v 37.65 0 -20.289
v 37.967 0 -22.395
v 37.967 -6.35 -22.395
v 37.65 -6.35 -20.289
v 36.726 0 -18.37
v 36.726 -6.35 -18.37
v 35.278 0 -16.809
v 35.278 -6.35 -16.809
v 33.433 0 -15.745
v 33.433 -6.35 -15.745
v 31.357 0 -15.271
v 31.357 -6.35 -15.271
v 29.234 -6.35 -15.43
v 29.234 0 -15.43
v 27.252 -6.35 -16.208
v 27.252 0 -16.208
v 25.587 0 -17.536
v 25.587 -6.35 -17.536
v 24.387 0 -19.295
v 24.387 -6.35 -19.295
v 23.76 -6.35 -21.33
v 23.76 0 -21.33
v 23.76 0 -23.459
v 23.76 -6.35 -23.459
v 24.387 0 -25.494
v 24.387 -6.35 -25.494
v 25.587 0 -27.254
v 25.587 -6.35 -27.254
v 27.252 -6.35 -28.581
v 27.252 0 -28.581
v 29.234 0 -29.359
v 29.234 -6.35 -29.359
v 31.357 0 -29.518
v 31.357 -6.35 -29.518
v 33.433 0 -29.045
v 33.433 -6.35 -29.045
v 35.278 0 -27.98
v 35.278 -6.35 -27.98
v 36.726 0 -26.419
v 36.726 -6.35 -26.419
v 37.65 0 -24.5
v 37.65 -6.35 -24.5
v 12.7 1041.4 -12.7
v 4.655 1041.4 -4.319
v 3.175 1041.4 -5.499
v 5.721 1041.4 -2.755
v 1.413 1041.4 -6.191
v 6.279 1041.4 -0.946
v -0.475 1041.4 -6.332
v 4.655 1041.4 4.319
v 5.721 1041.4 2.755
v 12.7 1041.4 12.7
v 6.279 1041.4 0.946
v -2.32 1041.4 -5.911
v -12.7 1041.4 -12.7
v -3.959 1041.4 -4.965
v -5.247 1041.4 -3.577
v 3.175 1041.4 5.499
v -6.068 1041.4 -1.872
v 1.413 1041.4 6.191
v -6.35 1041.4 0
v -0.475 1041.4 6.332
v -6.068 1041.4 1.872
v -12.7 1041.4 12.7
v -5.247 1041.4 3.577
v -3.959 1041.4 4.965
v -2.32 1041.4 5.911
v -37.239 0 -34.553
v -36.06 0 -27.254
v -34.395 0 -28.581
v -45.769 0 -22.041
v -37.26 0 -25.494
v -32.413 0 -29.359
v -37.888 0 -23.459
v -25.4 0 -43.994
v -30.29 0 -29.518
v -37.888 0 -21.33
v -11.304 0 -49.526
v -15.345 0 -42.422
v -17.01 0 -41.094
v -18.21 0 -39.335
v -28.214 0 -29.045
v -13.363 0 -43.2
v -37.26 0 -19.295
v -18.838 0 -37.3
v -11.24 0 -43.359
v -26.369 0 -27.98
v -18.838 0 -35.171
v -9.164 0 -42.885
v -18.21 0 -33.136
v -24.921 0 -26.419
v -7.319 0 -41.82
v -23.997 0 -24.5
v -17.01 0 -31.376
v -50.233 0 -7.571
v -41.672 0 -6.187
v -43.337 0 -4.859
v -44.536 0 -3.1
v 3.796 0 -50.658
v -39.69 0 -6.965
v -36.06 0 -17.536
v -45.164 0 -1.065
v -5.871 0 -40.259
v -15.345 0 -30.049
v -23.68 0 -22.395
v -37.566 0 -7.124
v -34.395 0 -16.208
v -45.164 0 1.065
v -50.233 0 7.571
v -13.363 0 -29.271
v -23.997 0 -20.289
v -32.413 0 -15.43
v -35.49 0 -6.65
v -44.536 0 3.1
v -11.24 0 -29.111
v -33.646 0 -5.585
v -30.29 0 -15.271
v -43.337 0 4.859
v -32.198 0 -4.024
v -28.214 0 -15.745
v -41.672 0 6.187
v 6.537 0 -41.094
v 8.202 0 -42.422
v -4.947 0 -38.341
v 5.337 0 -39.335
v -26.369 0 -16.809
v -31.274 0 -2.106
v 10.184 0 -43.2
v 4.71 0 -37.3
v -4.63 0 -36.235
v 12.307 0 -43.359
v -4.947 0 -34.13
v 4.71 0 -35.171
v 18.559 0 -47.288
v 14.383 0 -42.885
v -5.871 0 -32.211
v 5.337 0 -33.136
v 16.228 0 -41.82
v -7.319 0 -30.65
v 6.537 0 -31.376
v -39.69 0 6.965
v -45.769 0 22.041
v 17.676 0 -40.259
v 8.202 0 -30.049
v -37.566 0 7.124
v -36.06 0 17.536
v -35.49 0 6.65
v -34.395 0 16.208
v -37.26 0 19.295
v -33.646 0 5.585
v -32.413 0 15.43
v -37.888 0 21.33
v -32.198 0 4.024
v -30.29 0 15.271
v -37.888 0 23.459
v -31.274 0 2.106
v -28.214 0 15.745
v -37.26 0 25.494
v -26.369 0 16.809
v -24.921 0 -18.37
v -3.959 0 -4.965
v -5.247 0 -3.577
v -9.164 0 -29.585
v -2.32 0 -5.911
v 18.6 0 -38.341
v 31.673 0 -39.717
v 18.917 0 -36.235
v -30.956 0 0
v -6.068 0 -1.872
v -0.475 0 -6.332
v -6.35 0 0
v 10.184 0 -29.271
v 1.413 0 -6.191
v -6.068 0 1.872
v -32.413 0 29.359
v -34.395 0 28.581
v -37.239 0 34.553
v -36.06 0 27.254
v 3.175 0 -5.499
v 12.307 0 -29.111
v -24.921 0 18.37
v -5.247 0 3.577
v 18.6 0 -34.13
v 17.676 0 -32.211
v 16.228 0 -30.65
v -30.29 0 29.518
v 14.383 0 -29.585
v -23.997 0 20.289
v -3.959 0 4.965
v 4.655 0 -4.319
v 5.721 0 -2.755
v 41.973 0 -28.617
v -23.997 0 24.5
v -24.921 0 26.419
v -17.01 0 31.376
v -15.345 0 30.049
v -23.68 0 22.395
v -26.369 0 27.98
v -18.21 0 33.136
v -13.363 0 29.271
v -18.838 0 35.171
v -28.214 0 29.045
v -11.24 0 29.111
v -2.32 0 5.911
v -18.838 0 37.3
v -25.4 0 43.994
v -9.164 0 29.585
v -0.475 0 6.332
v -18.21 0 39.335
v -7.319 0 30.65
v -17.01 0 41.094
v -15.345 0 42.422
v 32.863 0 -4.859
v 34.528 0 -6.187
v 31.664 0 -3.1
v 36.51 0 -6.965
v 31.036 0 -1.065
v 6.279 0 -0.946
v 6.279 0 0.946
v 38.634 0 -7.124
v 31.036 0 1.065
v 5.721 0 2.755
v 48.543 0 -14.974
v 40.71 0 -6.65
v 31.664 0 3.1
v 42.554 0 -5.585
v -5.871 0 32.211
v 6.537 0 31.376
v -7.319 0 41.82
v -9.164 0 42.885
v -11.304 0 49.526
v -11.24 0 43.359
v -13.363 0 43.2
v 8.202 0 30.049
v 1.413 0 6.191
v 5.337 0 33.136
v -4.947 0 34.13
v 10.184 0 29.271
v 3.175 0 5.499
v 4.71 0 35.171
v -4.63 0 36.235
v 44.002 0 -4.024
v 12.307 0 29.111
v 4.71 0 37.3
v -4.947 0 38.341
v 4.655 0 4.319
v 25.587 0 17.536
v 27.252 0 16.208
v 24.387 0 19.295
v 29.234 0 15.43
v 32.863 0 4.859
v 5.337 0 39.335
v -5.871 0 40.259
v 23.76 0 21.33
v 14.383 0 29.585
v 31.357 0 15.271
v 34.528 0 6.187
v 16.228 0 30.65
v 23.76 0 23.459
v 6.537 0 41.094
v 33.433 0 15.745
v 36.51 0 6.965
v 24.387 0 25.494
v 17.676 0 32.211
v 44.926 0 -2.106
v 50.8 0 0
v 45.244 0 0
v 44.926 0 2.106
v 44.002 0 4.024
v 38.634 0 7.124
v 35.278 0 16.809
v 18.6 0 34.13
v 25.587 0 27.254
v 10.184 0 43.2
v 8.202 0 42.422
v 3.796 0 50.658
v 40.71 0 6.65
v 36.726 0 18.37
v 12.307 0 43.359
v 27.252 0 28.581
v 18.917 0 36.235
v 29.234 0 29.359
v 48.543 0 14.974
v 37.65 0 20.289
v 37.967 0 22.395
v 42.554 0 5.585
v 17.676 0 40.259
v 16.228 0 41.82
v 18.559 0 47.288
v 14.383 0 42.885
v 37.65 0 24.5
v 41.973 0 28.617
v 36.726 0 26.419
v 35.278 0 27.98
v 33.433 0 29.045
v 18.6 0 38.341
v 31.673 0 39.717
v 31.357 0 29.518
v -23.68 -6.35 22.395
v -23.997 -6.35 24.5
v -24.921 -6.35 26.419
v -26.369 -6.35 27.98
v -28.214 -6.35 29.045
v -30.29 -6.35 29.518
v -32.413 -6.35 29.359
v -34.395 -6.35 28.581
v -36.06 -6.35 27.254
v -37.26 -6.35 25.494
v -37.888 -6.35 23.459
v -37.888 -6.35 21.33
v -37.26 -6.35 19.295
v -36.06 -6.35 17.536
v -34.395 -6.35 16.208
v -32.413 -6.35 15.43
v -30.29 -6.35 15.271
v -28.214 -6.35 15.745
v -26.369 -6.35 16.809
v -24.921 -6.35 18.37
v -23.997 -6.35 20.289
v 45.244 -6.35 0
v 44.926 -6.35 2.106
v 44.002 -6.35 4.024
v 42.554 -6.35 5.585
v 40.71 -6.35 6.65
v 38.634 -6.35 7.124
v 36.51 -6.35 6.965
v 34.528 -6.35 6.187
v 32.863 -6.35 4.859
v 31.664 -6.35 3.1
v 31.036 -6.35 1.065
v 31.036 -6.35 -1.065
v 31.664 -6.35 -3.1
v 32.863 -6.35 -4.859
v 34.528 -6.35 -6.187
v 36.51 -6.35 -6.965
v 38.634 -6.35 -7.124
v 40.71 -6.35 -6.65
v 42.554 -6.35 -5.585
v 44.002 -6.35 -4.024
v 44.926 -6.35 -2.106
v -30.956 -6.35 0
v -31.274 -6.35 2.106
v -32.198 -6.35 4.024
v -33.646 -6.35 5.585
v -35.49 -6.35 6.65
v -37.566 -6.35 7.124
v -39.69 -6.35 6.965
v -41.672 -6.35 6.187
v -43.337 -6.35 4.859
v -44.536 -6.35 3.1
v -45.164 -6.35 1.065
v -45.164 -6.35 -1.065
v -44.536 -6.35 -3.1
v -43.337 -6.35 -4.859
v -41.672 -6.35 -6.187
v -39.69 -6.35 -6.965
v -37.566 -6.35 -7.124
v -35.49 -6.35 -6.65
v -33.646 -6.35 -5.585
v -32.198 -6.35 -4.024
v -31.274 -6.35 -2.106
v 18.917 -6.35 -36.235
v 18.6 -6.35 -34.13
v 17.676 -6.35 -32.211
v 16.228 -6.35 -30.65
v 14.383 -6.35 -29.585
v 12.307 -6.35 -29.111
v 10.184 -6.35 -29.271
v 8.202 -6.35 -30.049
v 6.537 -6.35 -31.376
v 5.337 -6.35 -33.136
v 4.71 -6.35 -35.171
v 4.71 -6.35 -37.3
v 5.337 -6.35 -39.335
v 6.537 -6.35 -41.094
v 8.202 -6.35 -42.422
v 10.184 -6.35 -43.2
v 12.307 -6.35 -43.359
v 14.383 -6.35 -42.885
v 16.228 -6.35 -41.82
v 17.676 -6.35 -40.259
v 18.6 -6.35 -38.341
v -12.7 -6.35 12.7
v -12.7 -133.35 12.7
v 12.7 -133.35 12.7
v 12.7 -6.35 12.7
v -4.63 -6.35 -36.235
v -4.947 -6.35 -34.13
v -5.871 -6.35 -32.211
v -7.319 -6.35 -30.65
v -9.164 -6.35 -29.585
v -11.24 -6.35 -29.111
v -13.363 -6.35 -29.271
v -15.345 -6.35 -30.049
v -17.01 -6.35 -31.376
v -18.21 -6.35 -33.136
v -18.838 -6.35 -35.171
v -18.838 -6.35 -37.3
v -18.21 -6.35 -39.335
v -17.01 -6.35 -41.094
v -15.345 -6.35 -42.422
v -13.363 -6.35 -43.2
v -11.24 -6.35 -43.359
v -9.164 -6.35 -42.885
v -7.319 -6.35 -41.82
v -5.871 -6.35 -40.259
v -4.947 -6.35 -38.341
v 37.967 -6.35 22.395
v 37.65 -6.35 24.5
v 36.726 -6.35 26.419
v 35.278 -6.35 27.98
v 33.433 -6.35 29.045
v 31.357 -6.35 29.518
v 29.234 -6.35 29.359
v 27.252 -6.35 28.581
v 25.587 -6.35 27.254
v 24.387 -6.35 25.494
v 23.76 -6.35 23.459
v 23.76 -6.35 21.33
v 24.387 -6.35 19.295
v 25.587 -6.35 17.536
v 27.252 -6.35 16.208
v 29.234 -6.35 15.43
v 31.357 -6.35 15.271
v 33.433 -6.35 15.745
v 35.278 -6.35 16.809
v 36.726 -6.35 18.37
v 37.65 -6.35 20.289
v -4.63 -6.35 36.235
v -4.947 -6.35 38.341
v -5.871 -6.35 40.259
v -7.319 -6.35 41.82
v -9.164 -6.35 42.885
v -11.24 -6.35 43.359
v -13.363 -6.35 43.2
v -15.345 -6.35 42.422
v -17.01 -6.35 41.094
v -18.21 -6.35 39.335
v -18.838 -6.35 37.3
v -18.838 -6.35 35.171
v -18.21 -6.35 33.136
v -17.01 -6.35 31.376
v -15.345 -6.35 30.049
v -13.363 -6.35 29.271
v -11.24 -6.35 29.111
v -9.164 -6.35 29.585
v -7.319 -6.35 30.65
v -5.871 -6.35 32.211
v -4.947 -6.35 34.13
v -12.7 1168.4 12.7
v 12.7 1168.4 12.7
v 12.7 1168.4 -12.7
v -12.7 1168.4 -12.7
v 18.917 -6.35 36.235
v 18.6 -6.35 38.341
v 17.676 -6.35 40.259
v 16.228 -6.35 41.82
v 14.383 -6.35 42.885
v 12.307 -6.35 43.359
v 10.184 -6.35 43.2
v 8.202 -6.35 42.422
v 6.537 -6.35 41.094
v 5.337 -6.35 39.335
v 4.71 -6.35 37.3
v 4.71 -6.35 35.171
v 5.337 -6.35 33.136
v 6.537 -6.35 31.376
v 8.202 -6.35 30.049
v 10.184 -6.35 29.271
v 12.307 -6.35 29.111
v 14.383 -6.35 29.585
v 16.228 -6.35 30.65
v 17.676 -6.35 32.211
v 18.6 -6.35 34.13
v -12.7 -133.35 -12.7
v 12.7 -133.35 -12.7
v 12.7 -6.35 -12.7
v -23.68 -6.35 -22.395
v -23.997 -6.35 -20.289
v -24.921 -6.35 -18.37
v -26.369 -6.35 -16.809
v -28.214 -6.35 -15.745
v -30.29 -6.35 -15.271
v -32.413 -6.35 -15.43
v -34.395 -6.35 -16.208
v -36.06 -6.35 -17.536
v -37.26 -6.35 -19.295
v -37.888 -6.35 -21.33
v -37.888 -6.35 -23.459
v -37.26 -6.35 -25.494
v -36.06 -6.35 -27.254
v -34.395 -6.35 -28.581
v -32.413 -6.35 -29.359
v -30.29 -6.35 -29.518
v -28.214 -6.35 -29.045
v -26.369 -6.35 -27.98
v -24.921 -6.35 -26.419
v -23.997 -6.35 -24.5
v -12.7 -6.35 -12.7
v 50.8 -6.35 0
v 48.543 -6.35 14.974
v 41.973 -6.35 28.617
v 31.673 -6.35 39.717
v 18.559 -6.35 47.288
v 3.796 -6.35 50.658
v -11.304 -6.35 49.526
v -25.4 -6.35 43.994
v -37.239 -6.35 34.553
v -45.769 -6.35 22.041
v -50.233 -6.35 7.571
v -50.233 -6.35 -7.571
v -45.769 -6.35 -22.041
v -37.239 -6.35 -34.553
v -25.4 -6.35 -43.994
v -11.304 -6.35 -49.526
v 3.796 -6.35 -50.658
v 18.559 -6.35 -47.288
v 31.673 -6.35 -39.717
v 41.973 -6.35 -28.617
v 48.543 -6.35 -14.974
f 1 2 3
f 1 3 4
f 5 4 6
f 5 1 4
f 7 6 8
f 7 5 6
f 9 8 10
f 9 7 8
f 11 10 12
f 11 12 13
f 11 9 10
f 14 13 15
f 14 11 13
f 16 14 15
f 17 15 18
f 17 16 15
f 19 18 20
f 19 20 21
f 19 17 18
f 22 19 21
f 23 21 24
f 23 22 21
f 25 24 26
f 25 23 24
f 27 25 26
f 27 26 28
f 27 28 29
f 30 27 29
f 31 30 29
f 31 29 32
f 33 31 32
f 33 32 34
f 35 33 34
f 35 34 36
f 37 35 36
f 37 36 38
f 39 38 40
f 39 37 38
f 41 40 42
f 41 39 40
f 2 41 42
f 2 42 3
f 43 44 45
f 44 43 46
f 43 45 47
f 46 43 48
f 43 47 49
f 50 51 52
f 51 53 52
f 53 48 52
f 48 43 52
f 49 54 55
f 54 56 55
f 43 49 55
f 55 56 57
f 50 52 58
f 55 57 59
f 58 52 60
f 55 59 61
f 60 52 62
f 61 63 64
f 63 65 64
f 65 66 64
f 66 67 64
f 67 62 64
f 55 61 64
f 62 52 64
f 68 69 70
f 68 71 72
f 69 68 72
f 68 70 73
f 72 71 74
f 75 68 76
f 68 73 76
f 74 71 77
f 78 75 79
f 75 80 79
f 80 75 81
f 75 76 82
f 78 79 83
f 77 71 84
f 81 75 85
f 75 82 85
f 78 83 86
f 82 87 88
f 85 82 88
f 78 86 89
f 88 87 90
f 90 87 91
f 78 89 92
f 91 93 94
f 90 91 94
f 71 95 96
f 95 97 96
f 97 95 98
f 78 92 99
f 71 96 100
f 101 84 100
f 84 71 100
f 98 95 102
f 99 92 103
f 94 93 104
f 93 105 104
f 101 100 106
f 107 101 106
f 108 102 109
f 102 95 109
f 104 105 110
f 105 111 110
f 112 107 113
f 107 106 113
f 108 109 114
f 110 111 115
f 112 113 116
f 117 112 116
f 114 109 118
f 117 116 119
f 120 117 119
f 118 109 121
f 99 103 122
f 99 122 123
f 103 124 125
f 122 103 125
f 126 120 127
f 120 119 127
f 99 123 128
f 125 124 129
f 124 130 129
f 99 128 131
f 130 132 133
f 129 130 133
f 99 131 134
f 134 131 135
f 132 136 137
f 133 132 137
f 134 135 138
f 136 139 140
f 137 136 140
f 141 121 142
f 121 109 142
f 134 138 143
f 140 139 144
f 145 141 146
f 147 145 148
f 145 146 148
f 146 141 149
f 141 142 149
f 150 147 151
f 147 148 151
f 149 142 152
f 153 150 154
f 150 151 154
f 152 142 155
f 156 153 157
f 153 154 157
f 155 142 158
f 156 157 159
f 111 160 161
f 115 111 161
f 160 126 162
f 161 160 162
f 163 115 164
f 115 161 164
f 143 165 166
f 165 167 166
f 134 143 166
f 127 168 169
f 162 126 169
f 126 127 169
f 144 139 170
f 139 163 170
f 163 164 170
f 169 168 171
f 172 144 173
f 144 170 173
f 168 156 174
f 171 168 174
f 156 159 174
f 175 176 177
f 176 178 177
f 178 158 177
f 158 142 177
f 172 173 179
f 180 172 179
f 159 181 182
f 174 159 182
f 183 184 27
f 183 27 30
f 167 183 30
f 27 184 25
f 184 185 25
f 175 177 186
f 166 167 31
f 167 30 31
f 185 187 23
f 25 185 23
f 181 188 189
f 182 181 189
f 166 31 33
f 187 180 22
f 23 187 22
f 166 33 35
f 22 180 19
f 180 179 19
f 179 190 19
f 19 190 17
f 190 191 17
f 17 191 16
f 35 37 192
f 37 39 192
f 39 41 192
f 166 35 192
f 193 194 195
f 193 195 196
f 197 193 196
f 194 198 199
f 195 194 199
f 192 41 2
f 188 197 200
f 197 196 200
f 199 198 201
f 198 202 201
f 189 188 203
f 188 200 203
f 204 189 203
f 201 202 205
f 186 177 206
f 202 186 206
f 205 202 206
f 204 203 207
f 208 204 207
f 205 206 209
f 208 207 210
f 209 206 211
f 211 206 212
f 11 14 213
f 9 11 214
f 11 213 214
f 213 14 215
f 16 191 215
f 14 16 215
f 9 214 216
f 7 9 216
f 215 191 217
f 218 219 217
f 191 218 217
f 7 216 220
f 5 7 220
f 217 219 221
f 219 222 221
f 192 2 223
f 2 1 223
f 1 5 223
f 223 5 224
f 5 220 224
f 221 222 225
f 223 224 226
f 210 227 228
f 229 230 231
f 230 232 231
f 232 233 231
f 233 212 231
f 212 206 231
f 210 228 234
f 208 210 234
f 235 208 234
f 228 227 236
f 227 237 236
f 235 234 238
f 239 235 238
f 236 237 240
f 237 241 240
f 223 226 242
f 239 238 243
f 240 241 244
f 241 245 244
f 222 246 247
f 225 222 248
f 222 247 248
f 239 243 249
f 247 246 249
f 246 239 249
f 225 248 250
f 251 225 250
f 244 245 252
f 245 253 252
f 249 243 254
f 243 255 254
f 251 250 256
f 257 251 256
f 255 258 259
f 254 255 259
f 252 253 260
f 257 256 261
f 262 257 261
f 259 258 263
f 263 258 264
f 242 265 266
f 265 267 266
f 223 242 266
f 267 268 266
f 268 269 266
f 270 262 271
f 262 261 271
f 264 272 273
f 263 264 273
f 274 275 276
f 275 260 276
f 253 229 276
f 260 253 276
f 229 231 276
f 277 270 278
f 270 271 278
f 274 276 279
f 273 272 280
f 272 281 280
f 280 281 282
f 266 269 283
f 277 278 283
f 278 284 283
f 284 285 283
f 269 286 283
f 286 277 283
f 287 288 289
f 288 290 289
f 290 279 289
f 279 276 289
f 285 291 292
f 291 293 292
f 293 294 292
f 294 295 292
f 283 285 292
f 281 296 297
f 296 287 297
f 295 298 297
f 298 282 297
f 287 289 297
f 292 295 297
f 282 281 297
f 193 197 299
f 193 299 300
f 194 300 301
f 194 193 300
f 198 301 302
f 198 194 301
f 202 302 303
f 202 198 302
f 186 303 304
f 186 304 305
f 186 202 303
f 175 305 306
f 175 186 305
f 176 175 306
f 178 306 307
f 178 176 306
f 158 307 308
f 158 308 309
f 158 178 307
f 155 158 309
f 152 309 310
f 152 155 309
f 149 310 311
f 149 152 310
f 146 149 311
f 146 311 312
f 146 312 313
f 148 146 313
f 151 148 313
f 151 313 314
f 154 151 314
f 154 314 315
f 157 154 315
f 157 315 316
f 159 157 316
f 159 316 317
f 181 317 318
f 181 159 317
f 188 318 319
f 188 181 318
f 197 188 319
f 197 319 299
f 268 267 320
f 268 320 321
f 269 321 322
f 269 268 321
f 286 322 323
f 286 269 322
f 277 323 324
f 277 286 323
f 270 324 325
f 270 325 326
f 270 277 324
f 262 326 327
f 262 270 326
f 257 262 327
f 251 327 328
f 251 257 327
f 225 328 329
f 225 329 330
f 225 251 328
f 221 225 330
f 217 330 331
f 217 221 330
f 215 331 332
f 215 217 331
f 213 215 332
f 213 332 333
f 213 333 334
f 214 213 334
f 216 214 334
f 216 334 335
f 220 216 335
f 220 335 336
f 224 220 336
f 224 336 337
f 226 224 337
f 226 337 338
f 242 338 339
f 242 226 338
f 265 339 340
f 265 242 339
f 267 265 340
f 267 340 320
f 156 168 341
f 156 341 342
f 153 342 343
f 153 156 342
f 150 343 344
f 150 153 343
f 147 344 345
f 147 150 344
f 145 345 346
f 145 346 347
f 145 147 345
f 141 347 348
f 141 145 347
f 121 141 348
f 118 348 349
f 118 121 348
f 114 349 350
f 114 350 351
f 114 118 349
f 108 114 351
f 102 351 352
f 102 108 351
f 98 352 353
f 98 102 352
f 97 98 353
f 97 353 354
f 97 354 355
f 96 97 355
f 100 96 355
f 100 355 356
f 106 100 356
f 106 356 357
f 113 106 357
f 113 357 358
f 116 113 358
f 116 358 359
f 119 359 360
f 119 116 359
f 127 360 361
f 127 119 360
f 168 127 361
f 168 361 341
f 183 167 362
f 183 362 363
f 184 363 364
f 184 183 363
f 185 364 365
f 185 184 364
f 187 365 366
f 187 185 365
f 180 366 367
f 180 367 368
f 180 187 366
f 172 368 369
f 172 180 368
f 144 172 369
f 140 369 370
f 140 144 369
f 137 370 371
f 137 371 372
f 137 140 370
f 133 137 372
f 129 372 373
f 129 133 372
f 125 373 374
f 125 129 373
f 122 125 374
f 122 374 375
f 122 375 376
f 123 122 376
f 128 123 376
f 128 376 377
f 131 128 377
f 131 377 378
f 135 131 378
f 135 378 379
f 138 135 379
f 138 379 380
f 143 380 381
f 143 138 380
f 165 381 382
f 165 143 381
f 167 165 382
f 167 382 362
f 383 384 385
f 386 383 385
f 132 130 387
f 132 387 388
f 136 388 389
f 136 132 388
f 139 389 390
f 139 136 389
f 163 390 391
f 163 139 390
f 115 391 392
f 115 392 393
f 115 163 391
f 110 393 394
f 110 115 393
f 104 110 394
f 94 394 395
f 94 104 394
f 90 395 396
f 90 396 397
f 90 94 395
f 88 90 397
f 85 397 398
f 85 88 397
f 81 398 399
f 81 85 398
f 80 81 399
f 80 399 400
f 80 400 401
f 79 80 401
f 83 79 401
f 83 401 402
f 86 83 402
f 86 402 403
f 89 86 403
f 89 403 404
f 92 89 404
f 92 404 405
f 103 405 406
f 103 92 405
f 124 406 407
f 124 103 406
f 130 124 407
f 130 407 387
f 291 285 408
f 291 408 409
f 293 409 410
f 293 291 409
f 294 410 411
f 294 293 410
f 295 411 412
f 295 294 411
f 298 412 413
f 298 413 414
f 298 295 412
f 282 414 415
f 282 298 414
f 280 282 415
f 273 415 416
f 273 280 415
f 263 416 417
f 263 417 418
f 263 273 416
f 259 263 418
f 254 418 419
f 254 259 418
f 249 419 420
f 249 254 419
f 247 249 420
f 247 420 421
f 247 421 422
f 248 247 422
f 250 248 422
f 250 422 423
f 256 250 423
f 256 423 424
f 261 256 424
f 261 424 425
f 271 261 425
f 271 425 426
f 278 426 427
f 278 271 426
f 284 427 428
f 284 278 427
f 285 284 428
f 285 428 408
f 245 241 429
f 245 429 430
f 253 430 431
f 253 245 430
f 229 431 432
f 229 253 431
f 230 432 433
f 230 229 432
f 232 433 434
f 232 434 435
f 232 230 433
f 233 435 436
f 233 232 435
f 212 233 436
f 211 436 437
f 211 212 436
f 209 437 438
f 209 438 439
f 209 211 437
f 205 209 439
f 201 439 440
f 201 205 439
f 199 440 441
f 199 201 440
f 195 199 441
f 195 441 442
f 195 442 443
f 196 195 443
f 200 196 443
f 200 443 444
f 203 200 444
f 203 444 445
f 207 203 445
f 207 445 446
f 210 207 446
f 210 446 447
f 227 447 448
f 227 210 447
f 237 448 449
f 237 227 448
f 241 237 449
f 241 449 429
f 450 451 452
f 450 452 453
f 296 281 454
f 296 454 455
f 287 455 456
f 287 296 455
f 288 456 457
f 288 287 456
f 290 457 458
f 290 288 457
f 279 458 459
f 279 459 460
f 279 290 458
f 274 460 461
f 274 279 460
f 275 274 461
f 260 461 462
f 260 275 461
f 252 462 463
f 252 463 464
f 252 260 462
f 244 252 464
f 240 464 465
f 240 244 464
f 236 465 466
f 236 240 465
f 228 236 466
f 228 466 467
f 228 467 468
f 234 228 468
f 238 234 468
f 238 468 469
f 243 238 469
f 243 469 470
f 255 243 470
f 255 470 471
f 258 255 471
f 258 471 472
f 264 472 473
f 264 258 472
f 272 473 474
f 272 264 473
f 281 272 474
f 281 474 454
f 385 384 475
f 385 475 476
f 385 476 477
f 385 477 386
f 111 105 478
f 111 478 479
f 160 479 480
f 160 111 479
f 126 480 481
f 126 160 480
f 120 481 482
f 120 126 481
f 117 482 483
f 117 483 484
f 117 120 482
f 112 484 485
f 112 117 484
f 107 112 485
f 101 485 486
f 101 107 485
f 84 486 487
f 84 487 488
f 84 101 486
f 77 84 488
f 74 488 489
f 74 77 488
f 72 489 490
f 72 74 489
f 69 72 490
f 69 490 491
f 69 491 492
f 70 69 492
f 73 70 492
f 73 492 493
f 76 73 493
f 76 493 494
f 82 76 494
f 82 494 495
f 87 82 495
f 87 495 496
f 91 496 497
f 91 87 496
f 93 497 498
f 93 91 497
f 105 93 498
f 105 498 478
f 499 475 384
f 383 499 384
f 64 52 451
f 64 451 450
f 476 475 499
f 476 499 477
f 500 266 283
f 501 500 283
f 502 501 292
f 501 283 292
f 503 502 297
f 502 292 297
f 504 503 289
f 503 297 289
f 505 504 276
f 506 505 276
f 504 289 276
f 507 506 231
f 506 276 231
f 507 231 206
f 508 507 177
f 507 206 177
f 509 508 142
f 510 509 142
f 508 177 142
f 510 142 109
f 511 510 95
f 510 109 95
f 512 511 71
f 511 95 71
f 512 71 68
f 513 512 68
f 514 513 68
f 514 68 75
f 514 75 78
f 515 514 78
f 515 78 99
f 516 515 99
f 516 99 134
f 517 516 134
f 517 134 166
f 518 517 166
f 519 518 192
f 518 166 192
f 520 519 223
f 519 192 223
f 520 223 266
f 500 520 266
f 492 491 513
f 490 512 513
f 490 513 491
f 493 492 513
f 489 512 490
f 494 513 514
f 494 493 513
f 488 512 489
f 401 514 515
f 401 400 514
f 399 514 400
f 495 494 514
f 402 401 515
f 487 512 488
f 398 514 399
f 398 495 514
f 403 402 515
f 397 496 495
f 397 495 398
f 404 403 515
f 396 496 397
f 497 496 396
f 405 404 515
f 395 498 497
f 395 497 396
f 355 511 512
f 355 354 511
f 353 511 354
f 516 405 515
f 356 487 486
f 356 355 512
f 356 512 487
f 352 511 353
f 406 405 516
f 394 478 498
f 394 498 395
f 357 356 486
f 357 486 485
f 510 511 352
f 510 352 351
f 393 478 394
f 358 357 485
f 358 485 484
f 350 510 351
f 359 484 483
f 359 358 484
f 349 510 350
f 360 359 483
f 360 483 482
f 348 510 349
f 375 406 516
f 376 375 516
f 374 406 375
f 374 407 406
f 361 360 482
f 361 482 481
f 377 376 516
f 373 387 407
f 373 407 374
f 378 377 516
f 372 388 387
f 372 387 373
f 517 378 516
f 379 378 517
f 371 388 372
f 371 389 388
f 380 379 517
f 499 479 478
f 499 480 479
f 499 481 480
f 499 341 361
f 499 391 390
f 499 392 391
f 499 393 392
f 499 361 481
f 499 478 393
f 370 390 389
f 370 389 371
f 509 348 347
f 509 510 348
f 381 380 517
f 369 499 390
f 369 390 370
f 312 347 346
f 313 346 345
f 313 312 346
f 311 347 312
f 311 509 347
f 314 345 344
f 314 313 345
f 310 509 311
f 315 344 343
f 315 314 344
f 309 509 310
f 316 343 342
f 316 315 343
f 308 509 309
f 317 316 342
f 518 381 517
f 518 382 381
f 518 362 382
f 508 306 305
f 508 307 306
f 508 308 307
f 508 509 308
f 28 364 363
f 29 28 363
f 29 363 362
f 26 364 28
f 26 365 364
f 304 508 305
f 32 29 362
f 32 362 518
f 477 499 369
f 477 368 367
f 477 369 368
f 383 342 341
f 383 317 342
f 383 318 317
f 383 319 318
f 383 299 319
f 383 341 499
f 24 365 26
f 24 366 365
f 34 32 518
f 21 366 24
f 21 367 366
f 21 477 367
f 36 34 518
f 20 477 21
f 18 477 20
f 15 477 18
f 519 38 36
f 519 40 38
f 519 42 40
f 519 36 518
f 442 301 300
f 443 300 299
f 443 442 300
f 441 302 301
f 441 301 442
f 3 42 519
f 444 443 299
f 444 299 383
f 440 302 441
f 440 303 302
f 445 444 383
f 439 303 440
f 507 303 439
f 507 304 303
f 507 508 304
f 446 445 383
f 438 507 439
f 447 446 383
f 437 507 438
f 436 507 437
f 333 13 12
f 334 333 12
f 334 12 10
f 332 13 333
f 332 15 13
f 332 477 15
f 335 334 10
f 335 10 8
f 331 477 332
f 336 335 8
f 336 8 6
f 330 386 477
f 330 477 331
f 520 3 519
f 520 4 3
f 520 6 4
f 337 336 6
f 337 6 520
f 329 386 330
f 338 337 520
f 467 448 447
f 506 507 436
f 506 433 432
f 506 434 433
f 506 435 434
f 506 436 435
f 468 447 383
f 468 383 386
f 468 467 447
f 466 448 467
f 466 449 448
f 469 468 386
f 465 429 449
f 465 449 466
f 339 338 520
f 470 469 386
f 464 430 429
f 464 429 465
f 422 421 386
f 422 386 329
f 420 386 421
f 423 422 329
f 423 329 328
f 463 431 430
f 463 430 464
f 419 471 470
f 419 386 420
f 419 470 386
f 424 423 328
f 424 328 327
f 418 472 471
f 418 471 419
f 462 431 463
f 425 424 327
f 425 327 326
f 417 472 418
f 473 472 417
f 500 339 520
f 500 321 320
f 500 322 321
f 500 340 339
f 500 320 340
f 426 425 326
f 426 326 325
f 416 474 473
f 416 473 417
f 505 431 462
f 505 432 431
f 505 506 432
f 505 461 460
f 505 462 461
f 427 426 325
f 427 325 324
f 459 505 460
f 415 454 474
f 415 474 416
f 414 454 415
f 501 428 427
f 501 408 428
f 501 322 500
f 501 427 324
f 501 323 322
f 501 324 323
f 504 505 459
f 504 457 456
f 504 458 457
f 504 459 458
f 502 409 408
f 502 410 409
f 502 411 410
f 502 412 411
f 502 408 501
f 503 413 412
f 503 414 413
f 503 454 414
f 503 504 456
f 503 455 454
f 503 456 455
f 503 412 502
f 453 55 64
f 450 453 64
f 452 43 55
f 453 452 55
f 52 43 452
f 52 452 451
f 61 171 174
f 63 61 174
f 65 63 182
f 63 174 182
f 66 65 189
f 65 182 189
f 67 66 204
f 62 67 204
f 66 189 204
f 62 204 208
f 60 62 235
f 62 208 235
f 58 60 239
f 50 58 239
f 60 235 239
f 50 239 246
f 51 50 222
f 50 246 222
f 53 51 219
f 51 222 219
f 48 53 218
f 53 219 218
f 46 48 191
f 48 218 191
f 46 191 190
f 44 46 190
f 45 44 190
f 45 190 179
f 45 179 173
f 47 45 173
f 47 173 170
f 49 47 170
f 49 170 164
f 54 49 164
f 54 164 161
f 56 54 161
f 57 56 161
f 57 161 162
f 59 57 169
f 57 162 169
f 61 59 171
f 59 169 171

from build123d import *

# Parameters (mm, degrees)
F0_R     = 50.8
F0_R_2   = 7.14375
F1_DEPTH = 6.35
F2_W     = 25.4
F2_H     = 25.4
F3_DEPTH = 127
F4_R     = 6.35
F5_DEPTH = 1041.4
F6_W     = 25.4
F6_H     = 25.4
F7_DEPTH = 127


with BuildPart() as f1:
    # F0 (on Front) → F1 (new body)
    with BuildSketch(Plane.XZ):
        Circle(F0_R)
        with Locations((-11.773547, -36.235253)):
            Circle(F0_R_2, mode=Mode.SUBTRACT)
        with Locations((-30.823547, -22.394618)):
            Circle(F0_R_2, mode=Mode.SUBTRACT)
        with Locations((-38.1, 0)):
            Circle(F0_R_2, mode=Mode.SUBTRACT)
        with Locations((11.773547, -36.235253)):
            Circle(F0_R_2, mode=Mode.SUBTRACT)
        with Locations((30.823547, -22.394618)):
            Circle(F0_R_2, mode=Mode.SUBTRACT)
        with Locations((38.1, 0)):
            Circle(F0_R_2, mode=Mode.SUBTRACT)
        with Locations((-30.823547, 22.394618)):
            Circle(F0_R_2, mode=Mode.SUBTRACT)
        with Locations((-11.773547, 36.235253)):
            Circle(F0_R_2, mode=Mode.SUBTRACT)
        with Locations((30.823547, 22.394618)):
            Circle(F0_R_2, mode=Mode.SUBTRACT)
        with Locations((11.773547, 36.235253)):
            Circle(F0_R_2, mode=Mode.SUBTRACT)
    extrude(amount=F1_DEPTH)



with BuildPart() as f3:
    # F2 (on face) → F3 (new body)
    with BuildSketch(Plane(origin=(0, 1041.4, 0), x_dir=(-1, 0, 0), z_dir=(0, 1, 0))):
        Rectangle(F2_W, F2_H)
    extrude(amount=F3_DEPTH)


with BuildPart() as f1_1:
    add(f1.part)

    add(f3.part)  # F5 merges F3
    # F4 (on face) → F5 (join)
    with BuildSketch(Plane(origin=(0, 0, 0), x_dir=(-1, 0, 0), z_dir=(0, 1, 0))):
        Circle(F4_R)
    extrude(amount=F5_DEPTH)

    # F6 (on face) → F7 (join)
    with BuildSketch(Plane.XZ.offset(6.35)):
        Rectangle(F6_W, F6_H)
    extrude(amount=F7_DEPTH)


solid = f1_1.part
